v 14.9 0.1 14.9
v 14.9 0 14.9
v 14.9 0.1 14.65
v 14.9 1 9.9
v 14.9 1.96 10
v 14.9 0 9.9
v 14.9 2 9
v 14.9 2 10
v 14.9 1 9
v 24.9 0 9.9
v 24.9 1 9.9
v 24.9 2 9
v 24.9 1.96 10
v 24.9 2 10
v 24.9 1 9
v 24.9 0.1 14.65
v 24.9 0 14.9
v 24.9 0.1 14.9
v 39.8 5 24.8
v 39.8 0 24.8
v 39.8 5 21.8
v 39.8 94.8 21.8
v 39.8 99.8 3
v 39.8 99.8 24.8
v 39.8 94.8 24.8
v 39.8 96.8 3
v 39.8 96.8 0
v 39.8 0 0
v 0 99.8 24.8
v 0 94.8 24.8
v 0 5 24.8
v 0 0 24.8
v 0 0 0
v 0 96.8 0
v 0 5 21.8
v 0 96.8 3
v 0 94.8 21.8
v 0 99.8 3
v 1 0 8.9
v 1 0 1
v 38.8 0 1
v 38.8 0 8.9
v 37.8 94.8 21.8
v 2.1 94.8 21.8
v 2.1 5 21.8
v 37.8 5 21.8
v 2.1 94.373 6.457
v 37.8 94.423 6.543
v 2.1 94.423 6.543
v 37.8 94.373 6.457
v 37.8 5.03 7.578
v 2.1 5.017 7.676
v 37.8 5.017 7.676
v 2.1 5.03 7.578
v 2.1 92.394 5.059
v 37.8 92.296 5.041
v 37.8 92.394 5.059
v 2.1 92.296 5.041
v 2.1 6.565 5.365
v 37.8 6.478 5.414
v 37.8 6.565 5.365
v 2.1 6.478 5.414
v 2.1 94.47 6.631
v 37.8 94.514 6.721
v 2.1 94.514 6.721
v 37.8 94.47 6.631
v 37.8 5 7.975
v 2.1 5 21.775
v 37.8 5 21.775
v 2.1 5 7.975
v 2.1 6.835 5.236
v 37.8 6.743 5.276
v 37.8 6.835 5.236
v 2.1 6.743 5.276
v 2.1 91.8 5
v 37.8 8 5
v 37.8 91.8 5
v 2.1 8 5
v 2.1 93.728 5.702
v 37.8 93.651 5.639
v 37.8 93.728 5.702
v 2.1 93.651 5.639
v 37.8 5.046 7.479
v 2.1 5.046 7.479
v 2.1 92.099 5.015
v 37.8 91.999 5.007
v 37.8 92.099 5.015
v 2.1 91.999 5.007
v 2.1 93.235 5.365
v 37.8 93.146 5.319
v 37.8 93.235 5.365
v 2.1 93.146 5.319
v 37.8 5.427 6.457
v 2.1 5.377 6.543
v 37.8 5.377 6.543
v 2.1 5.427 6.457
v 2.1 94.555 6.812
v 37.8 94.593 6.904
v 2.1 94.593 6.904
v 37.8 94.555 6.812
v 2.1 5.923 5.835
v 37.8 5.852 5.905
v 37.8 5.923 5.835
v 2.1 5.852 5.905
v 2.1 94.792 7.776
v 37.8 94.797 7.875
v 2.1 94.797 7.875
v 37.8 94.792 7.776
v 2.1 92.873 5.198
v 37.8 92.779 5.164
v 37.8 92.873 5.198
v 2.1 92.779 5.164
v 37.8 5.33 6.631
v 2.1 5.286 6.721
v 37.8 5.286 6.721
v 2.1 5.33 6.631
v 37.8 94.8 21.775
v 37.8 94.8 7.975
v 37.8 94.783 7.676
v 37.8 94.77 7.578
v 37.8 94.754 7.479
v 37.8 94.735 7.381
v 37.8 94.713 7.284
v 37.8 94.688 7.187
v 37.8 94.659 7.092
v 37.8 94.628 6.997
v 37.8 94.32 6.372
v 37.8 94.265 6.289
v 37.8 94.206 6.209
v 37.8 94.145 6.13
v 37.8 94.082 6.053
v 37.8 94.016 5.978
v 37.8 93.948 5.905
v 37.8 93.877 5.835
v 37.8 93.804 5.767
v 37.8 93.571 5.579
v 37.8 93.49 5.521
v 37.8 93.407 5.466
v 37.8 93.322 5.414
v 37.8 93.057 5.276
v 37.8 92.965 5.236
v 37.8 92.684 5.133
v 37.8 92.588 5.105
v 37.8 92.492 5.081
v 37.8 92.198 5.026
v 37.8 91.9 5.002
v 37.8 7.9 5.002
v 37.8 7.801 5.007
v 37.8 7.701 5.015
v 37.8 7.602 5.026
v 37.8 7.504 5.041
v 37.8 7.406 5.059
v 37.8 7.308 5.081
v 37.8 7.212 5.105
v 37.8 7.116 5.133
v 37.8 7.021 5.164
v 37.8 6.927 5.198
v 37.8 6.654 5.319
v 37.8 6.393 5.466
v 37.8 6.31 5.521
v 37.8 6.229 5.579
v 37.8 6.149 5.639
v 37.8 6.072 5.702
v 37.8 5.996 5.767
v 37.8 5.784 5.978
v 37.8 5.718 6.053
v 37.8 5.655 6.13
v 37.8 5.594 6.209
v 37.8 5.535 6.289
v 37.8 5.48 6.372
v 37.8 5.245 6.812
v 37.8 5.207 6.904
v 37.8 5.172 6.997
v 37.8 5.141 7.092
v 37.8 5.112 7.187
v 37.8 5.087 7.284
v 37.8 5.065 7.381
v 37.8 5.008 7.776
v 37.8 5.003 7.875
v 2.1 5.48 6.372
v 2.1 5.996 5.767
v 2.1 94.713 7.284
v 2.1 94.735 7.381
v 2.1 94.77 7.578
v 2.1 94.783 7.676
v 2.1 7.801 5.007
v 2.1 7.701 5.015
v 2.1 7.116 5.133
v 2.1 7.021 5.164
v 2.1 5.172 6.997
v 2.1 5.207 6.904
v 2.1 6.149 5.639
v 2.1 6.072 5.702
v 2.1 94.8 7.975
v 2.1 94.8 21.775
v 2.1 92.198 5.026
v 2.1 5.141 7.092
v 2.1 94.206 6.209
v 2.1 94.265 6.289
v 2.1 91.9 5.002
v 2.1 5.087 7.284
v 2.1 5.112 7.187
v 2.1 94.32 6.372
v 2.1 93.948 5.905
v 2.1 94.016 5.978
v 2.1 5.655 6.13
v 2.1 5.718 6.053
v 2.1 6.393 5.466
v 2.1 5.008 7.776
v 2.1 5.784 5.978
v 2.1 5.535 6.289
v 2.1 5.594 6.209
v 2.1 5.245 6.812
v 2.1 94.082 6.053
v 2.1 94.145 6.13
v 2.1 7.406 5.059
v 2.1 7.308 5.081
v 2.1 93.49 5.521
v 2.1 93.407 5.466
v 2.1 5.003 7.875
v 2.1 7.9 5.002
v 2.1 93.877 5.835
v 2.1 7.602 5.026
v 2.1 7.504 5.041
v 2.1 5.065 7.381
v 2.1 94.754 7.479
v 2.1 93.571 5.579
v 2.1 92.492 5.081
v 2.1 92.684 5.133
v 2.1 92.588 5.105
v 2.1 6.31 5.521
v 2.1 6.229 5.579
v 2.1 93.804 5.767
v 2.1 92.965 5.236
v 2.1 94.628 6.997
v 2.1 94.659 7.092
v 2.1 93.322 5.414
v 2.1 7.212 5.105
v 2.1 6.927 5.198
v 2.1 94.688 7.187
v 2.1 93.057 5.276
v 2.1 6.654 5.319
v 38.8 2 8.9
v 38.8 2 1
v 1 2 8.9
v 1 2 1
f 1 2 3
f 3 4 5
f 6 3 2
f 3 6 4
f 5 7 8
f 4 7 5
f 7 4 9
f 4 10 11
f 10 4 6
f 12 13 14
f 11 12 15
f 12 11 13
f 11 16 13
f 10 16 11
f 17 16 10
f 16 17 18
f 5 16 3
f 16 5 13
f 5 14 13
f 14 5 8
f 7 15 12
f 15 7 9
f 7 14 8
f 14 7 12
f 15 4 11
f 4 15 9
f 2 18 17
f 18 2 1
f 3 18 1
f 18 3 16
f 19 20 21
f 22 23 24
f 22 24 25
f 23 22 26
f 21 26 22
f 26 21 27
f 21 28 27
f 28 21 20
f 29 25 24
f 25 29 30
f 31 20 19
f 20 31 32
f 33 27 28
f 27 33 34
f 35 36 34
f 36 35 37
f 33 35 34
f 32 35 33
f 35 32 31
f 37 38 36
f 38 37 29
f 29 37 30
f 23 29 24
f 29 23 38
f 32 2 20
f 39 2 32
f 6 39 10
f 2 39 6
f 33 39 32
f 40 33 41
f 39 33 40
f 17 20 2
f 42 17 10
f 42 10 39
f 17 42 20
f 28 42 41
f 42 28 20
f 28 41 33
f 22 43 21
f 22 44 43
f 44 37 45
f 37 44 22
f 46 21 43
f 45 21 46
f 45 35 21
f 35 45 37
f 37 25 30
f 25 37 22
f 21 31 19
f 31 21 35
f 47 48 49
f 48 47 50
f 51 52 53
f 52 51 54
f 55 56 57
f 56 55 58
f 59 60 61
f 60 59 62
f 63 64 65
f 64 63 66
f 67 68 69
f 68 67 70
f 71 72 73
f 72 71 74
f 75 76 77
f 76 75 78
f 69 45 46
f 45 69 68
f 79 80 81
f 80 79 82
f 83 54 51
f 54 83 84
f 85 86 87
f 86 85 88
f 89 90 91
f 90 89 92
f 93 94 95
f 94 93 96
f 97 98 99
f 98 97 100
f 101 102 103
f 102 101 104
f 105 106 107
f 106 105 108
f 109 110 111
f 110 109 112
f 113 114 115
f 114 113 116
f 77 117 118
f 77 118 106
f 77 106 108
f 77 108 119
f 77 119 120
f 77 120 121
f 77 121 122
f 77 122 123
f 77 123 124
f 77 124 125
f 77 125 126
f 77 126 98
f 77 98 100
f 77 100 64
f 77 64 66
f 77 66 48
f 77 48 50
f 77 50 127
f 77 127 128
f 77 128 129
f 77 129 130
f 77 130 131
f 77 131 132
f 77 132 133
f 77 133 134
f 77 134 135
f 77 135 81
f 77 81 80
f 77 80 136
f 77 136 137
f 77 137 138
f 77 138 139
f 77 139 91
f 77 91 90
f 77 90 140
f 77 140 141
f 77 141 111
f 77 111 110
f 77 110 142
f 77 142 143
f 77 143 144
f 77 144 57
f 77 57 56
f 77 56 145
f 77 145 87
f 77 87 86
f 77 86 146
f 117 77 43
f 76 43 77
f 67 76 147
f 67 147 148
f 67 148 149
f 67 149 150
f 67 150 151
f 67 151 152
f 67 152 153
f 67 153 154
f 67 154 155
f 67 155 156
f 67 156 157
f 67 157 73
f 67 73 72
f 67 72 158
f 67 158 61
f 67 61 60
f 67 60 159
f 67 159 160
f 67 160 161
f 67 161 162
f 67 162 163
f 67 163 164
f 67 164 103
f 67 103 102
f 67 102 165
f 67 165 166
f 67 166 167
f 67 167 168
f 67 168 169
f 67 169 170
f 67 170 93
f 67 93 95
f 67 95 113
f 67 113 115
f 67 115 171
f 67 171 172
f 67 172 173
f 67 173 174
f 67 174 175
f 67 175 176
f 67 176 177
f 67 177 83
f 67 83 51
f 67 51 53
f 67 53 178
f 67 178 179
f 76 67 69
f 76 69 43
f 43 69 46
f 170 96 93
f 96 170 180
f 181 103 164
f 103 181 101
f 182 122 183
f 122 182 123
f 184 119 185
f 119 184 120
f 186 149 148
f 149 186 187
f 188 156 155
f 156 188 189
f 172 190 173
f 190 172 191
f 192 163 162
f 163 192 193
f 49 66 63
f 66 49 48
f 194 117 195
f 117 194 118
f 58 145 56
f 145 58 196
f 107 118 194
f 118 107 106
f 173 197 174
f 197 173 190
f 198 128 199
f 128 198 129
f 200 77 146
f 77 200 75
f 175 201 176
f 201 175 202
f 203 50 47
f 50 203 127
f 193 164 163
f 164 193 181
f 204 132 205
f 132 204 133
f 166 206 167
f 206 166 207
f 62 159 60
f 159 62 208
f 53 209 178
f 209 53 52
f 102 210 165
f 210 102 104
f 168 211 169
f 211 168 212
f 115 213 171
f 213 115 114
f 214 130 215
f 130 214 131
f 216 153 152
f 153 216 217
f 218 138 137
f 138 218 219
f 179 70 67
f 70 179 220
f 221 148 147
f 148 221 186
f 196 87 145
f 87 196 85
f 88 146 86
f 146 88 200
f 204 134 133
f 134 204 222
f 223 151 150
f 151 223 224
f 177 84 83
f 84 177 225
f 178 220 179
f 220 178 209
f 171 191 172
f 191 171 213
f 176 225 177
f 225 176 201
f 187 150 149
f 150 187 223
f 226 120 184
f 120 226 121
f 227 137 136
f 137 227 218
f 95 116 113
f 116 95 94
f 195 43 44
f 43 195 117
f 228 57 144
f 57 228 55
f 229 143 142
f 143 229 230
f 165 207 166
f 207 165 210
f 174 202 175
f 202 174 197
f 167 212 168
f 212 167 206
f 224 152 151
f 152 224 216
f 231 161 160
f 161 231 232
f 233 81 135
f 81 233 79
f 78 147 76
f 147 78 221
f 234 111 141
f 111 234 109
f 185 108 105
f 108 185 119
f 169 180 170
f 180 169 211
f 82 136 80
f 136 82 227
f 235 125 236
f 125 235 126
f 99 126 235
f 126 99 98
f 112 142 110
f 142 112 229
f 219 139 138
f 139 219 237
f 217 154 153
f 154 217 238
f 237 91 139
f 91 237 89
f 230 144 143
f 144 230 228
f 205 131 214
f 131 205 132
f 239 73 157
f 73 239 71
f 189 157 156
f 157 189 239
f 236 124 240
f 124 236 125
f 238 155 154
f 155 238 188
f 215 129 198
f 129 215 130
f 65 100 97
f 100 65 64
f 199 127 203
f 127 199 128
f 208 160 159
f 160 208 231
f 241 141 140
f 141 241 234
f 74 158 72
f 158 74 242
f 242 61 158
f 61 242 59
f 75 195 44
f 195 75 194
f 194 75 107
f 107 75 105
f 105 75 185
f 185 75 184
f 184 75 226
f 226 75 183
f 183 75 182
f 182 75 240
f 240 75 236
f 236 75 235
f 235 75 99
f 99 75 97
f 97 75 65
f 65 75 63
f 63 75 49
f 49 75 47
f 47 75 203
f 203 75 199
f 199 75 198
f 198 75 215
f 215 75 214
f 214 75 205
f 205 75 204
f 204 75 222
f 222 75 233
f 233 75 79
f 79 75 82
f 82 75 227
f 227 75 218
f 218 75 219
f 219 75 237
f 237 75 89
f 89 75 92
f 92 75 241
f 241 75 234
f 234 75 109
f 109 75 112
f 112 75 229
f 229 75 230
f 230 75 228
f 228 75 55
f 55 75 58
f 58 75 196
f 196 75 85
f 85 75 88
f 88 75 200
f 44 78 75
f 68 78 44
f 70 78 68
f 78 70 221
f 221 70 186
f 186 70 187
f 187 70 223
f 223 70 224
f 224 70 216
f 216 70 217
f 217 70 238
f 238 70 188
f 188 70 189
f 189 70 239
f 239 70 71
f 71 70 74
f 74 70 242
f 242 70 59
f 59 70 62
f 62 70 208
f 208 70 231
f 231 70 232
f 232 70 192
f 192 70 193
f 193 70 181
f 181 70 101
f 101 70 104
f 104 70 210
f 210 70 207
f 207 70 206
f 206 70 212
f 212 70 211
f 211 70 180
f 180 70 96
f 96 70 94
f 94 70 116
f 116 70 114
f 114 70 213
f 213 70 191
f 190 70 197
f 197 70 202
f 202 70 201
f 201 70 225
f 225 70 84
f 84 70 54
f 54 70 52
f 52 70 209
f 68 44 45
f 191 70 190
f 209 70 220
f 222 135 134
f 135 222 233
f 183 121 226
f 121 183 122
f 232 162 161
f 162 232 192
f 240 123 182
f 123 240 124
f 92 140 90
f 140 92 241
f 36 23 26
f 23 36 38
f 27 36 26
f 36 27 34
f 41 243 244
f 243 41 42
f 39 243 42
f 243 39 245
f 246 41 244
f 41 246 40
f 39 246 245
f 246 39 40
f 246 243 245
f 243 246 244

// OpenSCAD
// file: vendors/UtilitySCAD-R1/utility.scad
/*This library, part of UtilitySCAD, is placed into the public domain by NMR_Scientist.

Version: R1
Title: UtilitySCAD
Description: Miscellaneous utility modules I developed over the course of several projects to reuse common operations that were seen over various models.

History:
* ??/??/2024 - R1 - First release to be with a model whenever it is released.
*/

$fa = 1;
$fs = 0.1;

use <MCAD/regular_shapes.scad>;

//Move objects in the x-axis.
module move_x (x)
{
    translate([x,0,0])
    {
        children();
    }
}

//Move objects in the y-axis
module move_y (y)
{
    translate([0,y,0])
    {
        children();
    }
}

//Move objects in the z-ax
module move_z (z)
{
    translate([0,0,z])
    {
        children();
    }
}

//Move objects by a given point in all direction. -1 would means moving to the left, moving back, and moving down by one point.
module move_by(point)
{
    translate([point,point,point])
    {
        children();
    }
}

//Exactly like move_by, but a negation. Named for its very common use in adding tolerance to objects.
module move_by_margin(m)
{
    move_by(-m)
    {
        children();
    }
}

//A cylinder rotated to its side.
module hor_cylinder(width,r,r)
{
    move_y(r)
        move_z(r)
            rotate([0,90,0])
            {
                cylinder(width,r,r);
            }
}

module hor_cylinder_y(length,r)
{
    translate([r * 2,0,0])
    {
        rotate([0,0,90])
        {
            hor_cylinder(length,r);
        }
    }
}


//Cut a object at a given height and then move that object down, usually to zero if the object was placed at zero height.
module hor_cut(width,length,height)
{
    translate([0,0,-height])
    {
        difference()
        {
            children();
            translate([-1,-1,-1])
            {
                cube([width + 2,length + 2,height + 1]);
            }
        }
    }
}

function bevel_radius(length) = length * 2 / 3;
function bevel_height(r) = r * sqrt(3)/2;

//Bevel at 45 degree slope up, facing back, then extrude upward by height.
module bevel_up_back_45(width,length,height)
{
    r = bevel_radius(length);
    z = bevel_height(r);
    m = 0.1;
    m_2 = m * 2;
    difference()
    {
        translate([0,r / 2,z])
        {
            rotate([0,90,0])
            {
                triangle_prism(width,r);
            }
        }
        // Cut off to the required height.
        move_x(-m)
            move_y(-m)
                move_z(height)
                   cube([width + m,length + m,z * 2 - height]);
    }
    //If cutting off isn't happening simply add height.
    if (height >= z)
    {
        move_z(z)
        {
            cube([width,length,height - z]);
        }
    }
}

module bevel_up_front_45(width,length,height)
{
    r = bevel_radius(length);
    z = bevel_height(r);
    m = 0.1;
    m_2 = m * 2;
    difference()
    {
        translate([width,r,z])
        {
            rotate([0,90,180])
            {
                triangle_prism(width,r);
            }
        }
        // Cut off to the required height.
        move_x(-m)
            move_y(-m)
                move_z(height)
                   cube([width + m,length + m,z * 2 - height]);
    }
    //If cutting off isn't happening simply add height.
    if (height >= z)
    {
        move_z(z)
        {
            cube([width,length,height - z]);
        }
    }
}

module center_z(centering_z,target_z)
{
    z = (target_z - centering_z) / 2;
    translate([0,0,z])
    {
        children();
    }
}

module center_y(centering_y,target_y)
{
    y = (target_y - centering_y) / 2;
    translate([0,y,0])
    {
        children();
    }
}

//Center an object against a particular width of another object.
module center(centering_w,target_w)
{
    x = (target_w - centering_w) / 2;
    translate([x,0,0])
    {
        children();
    }
}

//Move object to a certain value of x, but also account for the object size, such that the object is place before the point x. For a postive value of x, that is before the x, for a negative value of x, that is next to x. Useful for dimensional accurate placement.
module move_object_x(x,r)
{
    diameter = r * 2;
    if (abs(x) < diameter)
    {
        echo("Cannot move!");
    }
    else
    {
        if (x > 0)
        {
            move_x(x - diameter)
            {
                children();
            }
        }
        else if (x < 0)
        {
            move_x(x + diameter)
                children();
        }
    }
}


//Move object to a certain value of z, but also account for the object size, such that the object is place before the point z. For a postive value of z, that is below of z, for a negative value of z, that is above z. Useful for dimensional accurate placement.
module move_object_z(z, r)
{
    diameter = r * 2;
    if (abs(z) < diameter)
    {
        echo("Cannot move!");
    }
    else
    {
        if (z > 0)
        {
            move_z(z - diameter)
            {
                children();
            }
        }
        else if (z < 0)
        {
            move_z(z + diameter)
                children();
        }
    }
}


//Generaate all notches in a castellation at the same time, and space each notch for the length of the notch.
module notches(n, multipler)
{
    for (x = [1:n])
    {
        final_x = (x - 1) * multipler;
        move_x(final_x)
        {
            if ((x - 1) % 2 == 0)
            {
               children();
            }
        }
    }
}

//Get the total width of the Castellation, starting with the first and last notches.
function CastellateTotalW(w,size) = (w - 1) % 2 == 1 ? (w - 1) * size.x : w * size.x;


//Center the resulting castellation of a certain cuboid size.
module castellate(width,size, m = 0)
{
    total_notches = floor(width / size.x);
    total_w = CastellateTotalW(total_notches,size);
    center(total_w,width)
    {
        notches(total_notches,size.x)
        {
            move_x(m)
            {
                shrink = [size.x - (m * 2),size.y,size.z];
                cube(shrink);
            }
        }
    }

}
// main file
$fa = 1;
$fs = 0.1;
use <vendors/UtilitySCAD-R1/utility.scad>;

function divide_by_y(target_l,center_l,times) = (target_l - center_l * (times - 1)) / times;

module hulling(inside_w,r,z,thickness)
{
    hor_cylinder(inside_w,r);
    translate([0,0,z - thickness - (r * 2)])
    {
        hor_cylinder(inside_w,r);
    }
}
module small_box(width,length,height,m = 0,print = "box",div=1)
{
    thickness = 5;
    side_thickness = 2;
    cut = 0.1;
    m_2 = m * 2;
    w = width - m_2;
    l = length - m_2;
    z = height - m_2;
    handle_w = 10;
    handle_h = 5;
    handle_l = 2;
    total_h = (z - handle_h) / 2 - 2;
    if (print == "box")
    {
        difference()
        {
            cube([w,l,z]);
            //Make the middle part height 3 mm lower. Helps make it easier to fit the drawers into the shipping container.
            translate([-cut,thickness,z - 3])
            {
                cube([w + (cut * 2),l - (thickness * 2),4]);
            }
            //inside volume
        
            translate([side_thickness + m,thickness,thickness])
            {
                r = 3;
                r_2 = r * 2;
                thickness_2 = thickness * 2;
                inside_w = w - (side_thickness * 2) - m;
                inside_l = l - thickness_2;
                wall = 2;
                divider_l = divide_by_y(inside_l,wall,div);
                for(i=[0:1:div - 1])
                {
                    hull()
                    {
                        translate([0,(divider_l + wall) * i,0])
                        {
                            hulling(inside_w,r,z,thickness);
                            translate([0,divider_l - r_2,0])
                            {
                                hulling(inside_w,r,z,thickness);

                            }
                        }
                    }
                }
            }
            translate([-cut,l - 3,-cut])
            {
                cube([w + (cut * 2),3 + cut,3 + cut]);
            }
            translate([1,-cut,1])
            {
                difference()
                {
                    cube([w - 2,2 + cut,total_h]);
                }
            }
            center_z(handle_h,z)
            {
                center(handle_w,w)
                {
                    handle(handle_w,handle_l,handle_h);
                        
                }
                
            }
        }
    }
    if (print == "nameplate")
    {
        translate([w + 1,0,0])
        {
            cube([w - 2 - m_2,total_h - m_2,2]);
        }
    }

}

module solid_cube(width,length,height)
{
    cube([width,length,height]);
}

small_box(40,100,25,0.1);

module handle(w,l,h)
{
    translate([0,0,0])
    {
        rotate([90,0,90])
        {
            linear_extrude(w)
            {
              polygon(points=[[0,0],[l,0],[0,h]],paths=[[0,1,2]]);
            }
        }
        translate([0,l - 1,-0.9])
        {
            cube([w,1,1]);
        }
        translate([0,-0.9,0])
        {
            cube([w,1,h]);
        }
    }
}
